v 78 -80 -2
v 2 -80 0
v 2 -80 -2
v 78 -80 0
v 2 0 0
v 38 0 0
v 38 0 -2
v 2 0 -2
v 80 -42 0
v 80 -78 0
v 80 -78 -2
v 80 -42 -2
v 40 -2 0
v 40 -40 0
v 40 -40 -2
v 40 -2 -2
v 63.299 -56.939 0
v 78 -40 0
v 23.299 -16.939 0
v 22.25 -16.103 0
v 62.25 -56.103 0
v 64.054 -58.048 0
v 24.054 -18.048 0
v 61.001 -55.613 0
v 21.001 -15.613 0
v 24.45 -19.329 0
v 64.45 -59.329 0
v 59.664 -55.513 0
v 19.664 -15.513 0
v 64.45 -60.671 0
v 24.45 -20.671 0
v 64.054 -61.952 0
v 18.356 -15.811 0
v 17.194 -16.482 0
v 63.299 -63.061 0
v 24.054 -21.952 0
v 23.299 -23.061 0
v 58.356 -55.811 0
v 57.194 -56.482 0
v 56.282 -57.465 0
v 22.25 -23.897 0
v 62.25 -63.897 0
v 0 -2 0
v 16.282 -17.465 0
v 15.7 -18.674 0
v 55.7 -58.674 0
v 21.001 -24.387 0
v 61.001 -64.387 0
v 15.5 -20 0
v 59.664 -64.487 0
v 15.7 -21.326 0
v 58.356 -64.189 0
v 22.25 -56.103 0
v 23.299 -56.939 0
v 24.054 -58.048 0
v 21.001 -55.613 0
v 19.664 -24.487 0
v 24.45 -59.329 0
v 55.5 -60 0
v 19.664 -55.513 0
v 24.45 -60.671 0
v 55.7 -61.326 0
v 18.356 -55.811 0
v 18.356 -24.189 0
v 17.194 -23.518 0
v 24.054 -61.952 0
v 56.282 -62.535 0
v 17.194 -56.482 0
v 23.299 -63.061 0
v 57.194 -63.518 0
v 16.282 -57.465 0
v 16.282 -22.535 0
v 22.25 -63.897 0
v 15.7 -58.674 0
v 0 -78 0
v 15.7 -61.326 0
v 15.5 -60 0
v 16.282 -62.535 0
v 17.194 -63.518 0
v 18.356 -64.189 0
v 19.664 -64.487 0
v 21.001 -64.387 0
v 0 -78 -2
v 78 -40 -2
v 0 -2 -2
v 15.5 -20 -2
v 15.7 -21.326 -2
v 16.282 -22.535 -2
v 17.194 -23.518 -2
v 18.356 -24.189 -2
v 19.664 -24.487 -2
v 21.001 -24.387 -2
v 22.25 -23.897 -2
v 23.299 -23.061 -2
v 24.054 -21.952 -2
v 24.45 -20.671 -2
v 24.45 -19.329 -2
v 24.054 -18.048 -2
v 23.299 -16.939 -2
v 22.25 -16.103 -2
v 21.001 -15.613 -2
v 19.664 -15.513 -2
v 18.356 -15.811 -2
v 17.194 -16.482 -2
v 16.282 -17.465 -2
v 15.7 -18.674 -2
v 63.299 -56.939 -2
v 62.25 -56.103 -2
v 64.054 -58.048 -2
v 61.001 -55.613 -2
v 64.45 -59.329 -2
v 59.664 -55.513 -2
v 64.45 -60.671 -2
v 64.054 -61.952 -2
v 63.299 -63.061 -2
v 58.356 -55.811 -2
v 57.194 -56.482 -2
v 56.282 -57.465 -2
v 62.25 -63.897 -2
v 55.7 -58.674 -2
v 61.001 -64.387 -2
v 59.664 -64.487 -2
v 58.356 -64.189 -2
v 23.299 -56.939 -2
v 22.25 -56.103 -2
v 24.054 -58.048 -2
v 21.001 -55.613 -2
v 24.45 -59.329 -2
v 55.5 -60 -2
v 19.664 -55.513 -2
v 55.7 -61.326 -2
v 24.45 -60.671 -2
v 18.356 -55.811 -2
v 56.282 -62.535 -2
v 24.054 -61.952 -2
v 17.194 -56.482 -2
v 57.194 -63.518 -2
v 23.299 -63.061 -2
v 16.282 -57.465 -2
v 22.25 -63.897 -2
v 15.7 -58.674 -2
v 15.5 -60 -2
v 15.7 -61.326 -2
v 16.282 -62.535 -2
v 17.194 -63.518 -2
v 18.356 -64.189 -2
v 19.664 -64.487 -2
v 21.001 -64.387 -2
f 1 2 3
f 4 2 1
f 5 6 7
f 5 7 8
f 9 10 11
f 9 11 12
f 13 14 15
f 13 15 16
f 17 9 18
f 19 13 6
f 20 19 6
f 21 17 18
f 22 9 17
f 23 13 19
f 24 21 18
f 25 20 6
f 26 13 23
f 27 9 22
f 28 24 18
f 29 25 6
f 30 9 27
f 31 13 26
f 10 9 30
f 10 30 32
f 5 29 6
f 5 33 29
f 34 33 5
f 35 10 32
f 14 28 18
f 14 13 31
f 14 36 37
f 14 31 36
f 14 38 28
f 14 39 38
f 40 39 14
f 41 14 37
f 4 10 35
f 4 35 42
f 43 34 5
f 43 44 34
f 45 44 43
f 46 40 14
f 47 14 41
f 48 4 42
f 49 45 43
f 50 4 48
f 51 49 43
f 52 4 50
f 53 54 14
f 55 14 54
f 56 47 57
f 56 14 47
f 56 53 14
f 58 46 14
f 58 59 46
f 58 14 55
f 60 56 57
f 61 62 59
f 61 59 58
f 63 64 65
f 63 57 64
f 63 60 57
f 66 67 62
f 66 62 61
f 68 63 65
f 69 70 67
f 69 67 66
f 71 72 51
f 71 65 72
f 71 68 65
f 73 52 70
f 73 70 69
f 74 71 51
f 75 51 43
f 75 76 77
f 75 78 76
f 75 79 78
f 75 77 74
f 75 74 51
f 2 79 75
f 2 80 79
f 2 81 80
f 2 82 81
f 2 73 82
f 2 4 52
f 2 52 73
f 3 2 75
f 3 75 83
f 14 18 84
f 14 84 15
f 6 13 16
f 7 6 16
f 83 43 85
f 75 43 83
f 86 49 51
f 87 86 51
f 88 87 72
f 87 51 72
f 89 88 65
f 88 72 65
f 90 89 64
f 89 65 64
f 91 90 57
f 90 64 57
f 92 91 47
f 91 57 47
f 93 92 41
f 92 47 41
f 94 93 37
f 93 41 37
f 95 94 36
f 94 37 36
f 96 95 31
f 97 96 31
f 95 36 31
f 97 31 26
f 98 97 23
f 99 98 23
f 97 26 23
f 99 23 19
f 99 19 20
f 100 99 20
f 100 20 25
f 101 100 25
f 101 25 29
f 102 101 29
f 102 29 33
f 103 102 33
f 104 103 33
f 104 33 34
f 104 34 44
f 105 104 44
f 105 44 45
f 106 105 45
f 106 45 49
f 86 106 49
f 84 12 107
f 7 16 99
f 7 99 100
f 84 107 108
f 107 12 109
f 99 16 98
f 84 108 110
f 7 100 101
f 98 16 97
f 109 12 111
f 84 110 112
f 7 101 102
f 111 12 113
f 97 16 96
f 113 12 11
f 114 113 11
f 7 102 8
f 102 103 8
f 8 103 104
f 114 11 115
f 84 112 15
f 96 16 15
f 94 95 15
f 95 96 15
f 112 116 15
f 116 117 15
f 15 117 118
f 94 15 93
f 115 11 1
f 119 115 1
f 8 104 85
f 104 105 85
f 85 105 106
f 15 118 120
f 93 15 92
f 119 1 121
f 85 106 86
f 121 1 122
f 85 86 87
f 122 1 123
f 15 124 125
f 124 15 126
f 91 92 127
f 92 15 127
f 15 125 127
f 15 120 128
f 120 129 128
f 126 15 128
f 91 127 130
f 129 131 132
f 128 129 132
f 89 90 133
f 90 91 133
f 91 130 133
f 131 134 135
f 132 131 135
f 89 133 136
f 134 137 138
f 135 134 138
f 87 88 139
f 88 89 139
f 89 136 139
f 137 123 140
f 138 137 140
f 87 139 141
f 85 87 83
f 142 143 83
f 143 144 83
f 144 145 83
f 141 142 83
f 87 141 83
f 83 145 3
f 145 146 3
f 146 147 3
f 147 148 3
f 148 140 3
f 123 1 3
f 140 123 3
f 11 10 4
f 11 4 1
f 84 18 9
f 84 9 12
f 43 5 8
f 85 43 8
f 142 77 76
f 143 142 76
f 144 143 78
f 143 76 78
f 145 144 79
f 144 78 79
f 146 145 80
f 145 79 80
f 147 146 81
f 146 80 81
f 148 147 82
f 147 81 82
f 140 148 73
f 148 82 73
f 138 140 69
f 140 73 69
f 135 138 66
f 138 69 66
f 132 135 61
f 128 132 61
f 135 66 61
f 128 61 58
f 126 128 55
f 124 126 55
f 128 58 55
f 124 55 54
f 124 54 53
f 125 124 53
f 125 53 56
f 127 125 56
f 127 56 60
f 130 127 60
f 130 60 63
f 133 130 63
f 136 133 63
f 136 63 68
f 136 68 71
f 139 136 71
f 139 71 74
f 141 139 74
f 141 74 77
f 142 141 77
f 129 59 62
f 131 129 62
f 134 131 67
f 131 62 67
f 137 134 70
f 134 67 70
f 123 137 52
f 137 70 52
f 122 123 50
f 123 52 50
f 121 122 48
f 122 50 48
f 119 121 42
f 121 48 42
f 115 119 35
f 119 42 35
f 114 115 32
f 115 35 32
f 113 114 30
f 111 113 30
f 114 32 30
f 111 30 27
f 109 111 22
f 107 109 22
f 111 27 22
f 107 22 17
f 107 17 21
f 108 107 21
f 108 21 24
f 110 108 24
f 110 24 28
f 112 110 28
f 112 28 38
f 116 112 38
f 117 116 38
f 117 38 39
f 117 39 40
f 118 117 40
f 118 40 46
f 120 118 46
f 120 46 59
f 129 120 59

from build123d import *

# Parameters (mm, degrees)
EXTRUDE_1_DEPTH   = 2
HOLE_WIZARD_M81_D = 9
CHAMFER_1_SIZE    = 2


with BuildPart() as part:
    # Эскиз1 → Бобышка-Вытянуть1 (new body)
    with BuildSketch(Plane(origin=(0, 0, 0), x_dir=(1, 0, 0), z_dir=(0, 0, -1))):
        Polygon((0, 0), (0, 80), (80, 80), (80, 40), (40, 40), (40, 0), align=None)
    extrude(amount=EXTRUDE_1_DEPTH)

    # Отверстие с зазором M81 (through all)
    with Locations(Plane(origin=(0, 0, -2), x_dir=(1, 0, 0), z_dir=(0, 0, -1))):
        with Locations((20, 60), (20, 20), (60, 60)):
            Hole(HOLE_WIZARD_M81_D / 2)

    # Фаска1
    chamfer_1_edges = [part.edges().sort_by_distance(p)[0] for p in [
        (0, 0, -1),
        (0, -80, -1),
        (80, -80, -1),
        (80, -40, -1),
        (40, 0, -1),
    ]]
    chamfer(chamfer_1_edges, length=CHAMFER_1_SIZE)


solid = part.part
